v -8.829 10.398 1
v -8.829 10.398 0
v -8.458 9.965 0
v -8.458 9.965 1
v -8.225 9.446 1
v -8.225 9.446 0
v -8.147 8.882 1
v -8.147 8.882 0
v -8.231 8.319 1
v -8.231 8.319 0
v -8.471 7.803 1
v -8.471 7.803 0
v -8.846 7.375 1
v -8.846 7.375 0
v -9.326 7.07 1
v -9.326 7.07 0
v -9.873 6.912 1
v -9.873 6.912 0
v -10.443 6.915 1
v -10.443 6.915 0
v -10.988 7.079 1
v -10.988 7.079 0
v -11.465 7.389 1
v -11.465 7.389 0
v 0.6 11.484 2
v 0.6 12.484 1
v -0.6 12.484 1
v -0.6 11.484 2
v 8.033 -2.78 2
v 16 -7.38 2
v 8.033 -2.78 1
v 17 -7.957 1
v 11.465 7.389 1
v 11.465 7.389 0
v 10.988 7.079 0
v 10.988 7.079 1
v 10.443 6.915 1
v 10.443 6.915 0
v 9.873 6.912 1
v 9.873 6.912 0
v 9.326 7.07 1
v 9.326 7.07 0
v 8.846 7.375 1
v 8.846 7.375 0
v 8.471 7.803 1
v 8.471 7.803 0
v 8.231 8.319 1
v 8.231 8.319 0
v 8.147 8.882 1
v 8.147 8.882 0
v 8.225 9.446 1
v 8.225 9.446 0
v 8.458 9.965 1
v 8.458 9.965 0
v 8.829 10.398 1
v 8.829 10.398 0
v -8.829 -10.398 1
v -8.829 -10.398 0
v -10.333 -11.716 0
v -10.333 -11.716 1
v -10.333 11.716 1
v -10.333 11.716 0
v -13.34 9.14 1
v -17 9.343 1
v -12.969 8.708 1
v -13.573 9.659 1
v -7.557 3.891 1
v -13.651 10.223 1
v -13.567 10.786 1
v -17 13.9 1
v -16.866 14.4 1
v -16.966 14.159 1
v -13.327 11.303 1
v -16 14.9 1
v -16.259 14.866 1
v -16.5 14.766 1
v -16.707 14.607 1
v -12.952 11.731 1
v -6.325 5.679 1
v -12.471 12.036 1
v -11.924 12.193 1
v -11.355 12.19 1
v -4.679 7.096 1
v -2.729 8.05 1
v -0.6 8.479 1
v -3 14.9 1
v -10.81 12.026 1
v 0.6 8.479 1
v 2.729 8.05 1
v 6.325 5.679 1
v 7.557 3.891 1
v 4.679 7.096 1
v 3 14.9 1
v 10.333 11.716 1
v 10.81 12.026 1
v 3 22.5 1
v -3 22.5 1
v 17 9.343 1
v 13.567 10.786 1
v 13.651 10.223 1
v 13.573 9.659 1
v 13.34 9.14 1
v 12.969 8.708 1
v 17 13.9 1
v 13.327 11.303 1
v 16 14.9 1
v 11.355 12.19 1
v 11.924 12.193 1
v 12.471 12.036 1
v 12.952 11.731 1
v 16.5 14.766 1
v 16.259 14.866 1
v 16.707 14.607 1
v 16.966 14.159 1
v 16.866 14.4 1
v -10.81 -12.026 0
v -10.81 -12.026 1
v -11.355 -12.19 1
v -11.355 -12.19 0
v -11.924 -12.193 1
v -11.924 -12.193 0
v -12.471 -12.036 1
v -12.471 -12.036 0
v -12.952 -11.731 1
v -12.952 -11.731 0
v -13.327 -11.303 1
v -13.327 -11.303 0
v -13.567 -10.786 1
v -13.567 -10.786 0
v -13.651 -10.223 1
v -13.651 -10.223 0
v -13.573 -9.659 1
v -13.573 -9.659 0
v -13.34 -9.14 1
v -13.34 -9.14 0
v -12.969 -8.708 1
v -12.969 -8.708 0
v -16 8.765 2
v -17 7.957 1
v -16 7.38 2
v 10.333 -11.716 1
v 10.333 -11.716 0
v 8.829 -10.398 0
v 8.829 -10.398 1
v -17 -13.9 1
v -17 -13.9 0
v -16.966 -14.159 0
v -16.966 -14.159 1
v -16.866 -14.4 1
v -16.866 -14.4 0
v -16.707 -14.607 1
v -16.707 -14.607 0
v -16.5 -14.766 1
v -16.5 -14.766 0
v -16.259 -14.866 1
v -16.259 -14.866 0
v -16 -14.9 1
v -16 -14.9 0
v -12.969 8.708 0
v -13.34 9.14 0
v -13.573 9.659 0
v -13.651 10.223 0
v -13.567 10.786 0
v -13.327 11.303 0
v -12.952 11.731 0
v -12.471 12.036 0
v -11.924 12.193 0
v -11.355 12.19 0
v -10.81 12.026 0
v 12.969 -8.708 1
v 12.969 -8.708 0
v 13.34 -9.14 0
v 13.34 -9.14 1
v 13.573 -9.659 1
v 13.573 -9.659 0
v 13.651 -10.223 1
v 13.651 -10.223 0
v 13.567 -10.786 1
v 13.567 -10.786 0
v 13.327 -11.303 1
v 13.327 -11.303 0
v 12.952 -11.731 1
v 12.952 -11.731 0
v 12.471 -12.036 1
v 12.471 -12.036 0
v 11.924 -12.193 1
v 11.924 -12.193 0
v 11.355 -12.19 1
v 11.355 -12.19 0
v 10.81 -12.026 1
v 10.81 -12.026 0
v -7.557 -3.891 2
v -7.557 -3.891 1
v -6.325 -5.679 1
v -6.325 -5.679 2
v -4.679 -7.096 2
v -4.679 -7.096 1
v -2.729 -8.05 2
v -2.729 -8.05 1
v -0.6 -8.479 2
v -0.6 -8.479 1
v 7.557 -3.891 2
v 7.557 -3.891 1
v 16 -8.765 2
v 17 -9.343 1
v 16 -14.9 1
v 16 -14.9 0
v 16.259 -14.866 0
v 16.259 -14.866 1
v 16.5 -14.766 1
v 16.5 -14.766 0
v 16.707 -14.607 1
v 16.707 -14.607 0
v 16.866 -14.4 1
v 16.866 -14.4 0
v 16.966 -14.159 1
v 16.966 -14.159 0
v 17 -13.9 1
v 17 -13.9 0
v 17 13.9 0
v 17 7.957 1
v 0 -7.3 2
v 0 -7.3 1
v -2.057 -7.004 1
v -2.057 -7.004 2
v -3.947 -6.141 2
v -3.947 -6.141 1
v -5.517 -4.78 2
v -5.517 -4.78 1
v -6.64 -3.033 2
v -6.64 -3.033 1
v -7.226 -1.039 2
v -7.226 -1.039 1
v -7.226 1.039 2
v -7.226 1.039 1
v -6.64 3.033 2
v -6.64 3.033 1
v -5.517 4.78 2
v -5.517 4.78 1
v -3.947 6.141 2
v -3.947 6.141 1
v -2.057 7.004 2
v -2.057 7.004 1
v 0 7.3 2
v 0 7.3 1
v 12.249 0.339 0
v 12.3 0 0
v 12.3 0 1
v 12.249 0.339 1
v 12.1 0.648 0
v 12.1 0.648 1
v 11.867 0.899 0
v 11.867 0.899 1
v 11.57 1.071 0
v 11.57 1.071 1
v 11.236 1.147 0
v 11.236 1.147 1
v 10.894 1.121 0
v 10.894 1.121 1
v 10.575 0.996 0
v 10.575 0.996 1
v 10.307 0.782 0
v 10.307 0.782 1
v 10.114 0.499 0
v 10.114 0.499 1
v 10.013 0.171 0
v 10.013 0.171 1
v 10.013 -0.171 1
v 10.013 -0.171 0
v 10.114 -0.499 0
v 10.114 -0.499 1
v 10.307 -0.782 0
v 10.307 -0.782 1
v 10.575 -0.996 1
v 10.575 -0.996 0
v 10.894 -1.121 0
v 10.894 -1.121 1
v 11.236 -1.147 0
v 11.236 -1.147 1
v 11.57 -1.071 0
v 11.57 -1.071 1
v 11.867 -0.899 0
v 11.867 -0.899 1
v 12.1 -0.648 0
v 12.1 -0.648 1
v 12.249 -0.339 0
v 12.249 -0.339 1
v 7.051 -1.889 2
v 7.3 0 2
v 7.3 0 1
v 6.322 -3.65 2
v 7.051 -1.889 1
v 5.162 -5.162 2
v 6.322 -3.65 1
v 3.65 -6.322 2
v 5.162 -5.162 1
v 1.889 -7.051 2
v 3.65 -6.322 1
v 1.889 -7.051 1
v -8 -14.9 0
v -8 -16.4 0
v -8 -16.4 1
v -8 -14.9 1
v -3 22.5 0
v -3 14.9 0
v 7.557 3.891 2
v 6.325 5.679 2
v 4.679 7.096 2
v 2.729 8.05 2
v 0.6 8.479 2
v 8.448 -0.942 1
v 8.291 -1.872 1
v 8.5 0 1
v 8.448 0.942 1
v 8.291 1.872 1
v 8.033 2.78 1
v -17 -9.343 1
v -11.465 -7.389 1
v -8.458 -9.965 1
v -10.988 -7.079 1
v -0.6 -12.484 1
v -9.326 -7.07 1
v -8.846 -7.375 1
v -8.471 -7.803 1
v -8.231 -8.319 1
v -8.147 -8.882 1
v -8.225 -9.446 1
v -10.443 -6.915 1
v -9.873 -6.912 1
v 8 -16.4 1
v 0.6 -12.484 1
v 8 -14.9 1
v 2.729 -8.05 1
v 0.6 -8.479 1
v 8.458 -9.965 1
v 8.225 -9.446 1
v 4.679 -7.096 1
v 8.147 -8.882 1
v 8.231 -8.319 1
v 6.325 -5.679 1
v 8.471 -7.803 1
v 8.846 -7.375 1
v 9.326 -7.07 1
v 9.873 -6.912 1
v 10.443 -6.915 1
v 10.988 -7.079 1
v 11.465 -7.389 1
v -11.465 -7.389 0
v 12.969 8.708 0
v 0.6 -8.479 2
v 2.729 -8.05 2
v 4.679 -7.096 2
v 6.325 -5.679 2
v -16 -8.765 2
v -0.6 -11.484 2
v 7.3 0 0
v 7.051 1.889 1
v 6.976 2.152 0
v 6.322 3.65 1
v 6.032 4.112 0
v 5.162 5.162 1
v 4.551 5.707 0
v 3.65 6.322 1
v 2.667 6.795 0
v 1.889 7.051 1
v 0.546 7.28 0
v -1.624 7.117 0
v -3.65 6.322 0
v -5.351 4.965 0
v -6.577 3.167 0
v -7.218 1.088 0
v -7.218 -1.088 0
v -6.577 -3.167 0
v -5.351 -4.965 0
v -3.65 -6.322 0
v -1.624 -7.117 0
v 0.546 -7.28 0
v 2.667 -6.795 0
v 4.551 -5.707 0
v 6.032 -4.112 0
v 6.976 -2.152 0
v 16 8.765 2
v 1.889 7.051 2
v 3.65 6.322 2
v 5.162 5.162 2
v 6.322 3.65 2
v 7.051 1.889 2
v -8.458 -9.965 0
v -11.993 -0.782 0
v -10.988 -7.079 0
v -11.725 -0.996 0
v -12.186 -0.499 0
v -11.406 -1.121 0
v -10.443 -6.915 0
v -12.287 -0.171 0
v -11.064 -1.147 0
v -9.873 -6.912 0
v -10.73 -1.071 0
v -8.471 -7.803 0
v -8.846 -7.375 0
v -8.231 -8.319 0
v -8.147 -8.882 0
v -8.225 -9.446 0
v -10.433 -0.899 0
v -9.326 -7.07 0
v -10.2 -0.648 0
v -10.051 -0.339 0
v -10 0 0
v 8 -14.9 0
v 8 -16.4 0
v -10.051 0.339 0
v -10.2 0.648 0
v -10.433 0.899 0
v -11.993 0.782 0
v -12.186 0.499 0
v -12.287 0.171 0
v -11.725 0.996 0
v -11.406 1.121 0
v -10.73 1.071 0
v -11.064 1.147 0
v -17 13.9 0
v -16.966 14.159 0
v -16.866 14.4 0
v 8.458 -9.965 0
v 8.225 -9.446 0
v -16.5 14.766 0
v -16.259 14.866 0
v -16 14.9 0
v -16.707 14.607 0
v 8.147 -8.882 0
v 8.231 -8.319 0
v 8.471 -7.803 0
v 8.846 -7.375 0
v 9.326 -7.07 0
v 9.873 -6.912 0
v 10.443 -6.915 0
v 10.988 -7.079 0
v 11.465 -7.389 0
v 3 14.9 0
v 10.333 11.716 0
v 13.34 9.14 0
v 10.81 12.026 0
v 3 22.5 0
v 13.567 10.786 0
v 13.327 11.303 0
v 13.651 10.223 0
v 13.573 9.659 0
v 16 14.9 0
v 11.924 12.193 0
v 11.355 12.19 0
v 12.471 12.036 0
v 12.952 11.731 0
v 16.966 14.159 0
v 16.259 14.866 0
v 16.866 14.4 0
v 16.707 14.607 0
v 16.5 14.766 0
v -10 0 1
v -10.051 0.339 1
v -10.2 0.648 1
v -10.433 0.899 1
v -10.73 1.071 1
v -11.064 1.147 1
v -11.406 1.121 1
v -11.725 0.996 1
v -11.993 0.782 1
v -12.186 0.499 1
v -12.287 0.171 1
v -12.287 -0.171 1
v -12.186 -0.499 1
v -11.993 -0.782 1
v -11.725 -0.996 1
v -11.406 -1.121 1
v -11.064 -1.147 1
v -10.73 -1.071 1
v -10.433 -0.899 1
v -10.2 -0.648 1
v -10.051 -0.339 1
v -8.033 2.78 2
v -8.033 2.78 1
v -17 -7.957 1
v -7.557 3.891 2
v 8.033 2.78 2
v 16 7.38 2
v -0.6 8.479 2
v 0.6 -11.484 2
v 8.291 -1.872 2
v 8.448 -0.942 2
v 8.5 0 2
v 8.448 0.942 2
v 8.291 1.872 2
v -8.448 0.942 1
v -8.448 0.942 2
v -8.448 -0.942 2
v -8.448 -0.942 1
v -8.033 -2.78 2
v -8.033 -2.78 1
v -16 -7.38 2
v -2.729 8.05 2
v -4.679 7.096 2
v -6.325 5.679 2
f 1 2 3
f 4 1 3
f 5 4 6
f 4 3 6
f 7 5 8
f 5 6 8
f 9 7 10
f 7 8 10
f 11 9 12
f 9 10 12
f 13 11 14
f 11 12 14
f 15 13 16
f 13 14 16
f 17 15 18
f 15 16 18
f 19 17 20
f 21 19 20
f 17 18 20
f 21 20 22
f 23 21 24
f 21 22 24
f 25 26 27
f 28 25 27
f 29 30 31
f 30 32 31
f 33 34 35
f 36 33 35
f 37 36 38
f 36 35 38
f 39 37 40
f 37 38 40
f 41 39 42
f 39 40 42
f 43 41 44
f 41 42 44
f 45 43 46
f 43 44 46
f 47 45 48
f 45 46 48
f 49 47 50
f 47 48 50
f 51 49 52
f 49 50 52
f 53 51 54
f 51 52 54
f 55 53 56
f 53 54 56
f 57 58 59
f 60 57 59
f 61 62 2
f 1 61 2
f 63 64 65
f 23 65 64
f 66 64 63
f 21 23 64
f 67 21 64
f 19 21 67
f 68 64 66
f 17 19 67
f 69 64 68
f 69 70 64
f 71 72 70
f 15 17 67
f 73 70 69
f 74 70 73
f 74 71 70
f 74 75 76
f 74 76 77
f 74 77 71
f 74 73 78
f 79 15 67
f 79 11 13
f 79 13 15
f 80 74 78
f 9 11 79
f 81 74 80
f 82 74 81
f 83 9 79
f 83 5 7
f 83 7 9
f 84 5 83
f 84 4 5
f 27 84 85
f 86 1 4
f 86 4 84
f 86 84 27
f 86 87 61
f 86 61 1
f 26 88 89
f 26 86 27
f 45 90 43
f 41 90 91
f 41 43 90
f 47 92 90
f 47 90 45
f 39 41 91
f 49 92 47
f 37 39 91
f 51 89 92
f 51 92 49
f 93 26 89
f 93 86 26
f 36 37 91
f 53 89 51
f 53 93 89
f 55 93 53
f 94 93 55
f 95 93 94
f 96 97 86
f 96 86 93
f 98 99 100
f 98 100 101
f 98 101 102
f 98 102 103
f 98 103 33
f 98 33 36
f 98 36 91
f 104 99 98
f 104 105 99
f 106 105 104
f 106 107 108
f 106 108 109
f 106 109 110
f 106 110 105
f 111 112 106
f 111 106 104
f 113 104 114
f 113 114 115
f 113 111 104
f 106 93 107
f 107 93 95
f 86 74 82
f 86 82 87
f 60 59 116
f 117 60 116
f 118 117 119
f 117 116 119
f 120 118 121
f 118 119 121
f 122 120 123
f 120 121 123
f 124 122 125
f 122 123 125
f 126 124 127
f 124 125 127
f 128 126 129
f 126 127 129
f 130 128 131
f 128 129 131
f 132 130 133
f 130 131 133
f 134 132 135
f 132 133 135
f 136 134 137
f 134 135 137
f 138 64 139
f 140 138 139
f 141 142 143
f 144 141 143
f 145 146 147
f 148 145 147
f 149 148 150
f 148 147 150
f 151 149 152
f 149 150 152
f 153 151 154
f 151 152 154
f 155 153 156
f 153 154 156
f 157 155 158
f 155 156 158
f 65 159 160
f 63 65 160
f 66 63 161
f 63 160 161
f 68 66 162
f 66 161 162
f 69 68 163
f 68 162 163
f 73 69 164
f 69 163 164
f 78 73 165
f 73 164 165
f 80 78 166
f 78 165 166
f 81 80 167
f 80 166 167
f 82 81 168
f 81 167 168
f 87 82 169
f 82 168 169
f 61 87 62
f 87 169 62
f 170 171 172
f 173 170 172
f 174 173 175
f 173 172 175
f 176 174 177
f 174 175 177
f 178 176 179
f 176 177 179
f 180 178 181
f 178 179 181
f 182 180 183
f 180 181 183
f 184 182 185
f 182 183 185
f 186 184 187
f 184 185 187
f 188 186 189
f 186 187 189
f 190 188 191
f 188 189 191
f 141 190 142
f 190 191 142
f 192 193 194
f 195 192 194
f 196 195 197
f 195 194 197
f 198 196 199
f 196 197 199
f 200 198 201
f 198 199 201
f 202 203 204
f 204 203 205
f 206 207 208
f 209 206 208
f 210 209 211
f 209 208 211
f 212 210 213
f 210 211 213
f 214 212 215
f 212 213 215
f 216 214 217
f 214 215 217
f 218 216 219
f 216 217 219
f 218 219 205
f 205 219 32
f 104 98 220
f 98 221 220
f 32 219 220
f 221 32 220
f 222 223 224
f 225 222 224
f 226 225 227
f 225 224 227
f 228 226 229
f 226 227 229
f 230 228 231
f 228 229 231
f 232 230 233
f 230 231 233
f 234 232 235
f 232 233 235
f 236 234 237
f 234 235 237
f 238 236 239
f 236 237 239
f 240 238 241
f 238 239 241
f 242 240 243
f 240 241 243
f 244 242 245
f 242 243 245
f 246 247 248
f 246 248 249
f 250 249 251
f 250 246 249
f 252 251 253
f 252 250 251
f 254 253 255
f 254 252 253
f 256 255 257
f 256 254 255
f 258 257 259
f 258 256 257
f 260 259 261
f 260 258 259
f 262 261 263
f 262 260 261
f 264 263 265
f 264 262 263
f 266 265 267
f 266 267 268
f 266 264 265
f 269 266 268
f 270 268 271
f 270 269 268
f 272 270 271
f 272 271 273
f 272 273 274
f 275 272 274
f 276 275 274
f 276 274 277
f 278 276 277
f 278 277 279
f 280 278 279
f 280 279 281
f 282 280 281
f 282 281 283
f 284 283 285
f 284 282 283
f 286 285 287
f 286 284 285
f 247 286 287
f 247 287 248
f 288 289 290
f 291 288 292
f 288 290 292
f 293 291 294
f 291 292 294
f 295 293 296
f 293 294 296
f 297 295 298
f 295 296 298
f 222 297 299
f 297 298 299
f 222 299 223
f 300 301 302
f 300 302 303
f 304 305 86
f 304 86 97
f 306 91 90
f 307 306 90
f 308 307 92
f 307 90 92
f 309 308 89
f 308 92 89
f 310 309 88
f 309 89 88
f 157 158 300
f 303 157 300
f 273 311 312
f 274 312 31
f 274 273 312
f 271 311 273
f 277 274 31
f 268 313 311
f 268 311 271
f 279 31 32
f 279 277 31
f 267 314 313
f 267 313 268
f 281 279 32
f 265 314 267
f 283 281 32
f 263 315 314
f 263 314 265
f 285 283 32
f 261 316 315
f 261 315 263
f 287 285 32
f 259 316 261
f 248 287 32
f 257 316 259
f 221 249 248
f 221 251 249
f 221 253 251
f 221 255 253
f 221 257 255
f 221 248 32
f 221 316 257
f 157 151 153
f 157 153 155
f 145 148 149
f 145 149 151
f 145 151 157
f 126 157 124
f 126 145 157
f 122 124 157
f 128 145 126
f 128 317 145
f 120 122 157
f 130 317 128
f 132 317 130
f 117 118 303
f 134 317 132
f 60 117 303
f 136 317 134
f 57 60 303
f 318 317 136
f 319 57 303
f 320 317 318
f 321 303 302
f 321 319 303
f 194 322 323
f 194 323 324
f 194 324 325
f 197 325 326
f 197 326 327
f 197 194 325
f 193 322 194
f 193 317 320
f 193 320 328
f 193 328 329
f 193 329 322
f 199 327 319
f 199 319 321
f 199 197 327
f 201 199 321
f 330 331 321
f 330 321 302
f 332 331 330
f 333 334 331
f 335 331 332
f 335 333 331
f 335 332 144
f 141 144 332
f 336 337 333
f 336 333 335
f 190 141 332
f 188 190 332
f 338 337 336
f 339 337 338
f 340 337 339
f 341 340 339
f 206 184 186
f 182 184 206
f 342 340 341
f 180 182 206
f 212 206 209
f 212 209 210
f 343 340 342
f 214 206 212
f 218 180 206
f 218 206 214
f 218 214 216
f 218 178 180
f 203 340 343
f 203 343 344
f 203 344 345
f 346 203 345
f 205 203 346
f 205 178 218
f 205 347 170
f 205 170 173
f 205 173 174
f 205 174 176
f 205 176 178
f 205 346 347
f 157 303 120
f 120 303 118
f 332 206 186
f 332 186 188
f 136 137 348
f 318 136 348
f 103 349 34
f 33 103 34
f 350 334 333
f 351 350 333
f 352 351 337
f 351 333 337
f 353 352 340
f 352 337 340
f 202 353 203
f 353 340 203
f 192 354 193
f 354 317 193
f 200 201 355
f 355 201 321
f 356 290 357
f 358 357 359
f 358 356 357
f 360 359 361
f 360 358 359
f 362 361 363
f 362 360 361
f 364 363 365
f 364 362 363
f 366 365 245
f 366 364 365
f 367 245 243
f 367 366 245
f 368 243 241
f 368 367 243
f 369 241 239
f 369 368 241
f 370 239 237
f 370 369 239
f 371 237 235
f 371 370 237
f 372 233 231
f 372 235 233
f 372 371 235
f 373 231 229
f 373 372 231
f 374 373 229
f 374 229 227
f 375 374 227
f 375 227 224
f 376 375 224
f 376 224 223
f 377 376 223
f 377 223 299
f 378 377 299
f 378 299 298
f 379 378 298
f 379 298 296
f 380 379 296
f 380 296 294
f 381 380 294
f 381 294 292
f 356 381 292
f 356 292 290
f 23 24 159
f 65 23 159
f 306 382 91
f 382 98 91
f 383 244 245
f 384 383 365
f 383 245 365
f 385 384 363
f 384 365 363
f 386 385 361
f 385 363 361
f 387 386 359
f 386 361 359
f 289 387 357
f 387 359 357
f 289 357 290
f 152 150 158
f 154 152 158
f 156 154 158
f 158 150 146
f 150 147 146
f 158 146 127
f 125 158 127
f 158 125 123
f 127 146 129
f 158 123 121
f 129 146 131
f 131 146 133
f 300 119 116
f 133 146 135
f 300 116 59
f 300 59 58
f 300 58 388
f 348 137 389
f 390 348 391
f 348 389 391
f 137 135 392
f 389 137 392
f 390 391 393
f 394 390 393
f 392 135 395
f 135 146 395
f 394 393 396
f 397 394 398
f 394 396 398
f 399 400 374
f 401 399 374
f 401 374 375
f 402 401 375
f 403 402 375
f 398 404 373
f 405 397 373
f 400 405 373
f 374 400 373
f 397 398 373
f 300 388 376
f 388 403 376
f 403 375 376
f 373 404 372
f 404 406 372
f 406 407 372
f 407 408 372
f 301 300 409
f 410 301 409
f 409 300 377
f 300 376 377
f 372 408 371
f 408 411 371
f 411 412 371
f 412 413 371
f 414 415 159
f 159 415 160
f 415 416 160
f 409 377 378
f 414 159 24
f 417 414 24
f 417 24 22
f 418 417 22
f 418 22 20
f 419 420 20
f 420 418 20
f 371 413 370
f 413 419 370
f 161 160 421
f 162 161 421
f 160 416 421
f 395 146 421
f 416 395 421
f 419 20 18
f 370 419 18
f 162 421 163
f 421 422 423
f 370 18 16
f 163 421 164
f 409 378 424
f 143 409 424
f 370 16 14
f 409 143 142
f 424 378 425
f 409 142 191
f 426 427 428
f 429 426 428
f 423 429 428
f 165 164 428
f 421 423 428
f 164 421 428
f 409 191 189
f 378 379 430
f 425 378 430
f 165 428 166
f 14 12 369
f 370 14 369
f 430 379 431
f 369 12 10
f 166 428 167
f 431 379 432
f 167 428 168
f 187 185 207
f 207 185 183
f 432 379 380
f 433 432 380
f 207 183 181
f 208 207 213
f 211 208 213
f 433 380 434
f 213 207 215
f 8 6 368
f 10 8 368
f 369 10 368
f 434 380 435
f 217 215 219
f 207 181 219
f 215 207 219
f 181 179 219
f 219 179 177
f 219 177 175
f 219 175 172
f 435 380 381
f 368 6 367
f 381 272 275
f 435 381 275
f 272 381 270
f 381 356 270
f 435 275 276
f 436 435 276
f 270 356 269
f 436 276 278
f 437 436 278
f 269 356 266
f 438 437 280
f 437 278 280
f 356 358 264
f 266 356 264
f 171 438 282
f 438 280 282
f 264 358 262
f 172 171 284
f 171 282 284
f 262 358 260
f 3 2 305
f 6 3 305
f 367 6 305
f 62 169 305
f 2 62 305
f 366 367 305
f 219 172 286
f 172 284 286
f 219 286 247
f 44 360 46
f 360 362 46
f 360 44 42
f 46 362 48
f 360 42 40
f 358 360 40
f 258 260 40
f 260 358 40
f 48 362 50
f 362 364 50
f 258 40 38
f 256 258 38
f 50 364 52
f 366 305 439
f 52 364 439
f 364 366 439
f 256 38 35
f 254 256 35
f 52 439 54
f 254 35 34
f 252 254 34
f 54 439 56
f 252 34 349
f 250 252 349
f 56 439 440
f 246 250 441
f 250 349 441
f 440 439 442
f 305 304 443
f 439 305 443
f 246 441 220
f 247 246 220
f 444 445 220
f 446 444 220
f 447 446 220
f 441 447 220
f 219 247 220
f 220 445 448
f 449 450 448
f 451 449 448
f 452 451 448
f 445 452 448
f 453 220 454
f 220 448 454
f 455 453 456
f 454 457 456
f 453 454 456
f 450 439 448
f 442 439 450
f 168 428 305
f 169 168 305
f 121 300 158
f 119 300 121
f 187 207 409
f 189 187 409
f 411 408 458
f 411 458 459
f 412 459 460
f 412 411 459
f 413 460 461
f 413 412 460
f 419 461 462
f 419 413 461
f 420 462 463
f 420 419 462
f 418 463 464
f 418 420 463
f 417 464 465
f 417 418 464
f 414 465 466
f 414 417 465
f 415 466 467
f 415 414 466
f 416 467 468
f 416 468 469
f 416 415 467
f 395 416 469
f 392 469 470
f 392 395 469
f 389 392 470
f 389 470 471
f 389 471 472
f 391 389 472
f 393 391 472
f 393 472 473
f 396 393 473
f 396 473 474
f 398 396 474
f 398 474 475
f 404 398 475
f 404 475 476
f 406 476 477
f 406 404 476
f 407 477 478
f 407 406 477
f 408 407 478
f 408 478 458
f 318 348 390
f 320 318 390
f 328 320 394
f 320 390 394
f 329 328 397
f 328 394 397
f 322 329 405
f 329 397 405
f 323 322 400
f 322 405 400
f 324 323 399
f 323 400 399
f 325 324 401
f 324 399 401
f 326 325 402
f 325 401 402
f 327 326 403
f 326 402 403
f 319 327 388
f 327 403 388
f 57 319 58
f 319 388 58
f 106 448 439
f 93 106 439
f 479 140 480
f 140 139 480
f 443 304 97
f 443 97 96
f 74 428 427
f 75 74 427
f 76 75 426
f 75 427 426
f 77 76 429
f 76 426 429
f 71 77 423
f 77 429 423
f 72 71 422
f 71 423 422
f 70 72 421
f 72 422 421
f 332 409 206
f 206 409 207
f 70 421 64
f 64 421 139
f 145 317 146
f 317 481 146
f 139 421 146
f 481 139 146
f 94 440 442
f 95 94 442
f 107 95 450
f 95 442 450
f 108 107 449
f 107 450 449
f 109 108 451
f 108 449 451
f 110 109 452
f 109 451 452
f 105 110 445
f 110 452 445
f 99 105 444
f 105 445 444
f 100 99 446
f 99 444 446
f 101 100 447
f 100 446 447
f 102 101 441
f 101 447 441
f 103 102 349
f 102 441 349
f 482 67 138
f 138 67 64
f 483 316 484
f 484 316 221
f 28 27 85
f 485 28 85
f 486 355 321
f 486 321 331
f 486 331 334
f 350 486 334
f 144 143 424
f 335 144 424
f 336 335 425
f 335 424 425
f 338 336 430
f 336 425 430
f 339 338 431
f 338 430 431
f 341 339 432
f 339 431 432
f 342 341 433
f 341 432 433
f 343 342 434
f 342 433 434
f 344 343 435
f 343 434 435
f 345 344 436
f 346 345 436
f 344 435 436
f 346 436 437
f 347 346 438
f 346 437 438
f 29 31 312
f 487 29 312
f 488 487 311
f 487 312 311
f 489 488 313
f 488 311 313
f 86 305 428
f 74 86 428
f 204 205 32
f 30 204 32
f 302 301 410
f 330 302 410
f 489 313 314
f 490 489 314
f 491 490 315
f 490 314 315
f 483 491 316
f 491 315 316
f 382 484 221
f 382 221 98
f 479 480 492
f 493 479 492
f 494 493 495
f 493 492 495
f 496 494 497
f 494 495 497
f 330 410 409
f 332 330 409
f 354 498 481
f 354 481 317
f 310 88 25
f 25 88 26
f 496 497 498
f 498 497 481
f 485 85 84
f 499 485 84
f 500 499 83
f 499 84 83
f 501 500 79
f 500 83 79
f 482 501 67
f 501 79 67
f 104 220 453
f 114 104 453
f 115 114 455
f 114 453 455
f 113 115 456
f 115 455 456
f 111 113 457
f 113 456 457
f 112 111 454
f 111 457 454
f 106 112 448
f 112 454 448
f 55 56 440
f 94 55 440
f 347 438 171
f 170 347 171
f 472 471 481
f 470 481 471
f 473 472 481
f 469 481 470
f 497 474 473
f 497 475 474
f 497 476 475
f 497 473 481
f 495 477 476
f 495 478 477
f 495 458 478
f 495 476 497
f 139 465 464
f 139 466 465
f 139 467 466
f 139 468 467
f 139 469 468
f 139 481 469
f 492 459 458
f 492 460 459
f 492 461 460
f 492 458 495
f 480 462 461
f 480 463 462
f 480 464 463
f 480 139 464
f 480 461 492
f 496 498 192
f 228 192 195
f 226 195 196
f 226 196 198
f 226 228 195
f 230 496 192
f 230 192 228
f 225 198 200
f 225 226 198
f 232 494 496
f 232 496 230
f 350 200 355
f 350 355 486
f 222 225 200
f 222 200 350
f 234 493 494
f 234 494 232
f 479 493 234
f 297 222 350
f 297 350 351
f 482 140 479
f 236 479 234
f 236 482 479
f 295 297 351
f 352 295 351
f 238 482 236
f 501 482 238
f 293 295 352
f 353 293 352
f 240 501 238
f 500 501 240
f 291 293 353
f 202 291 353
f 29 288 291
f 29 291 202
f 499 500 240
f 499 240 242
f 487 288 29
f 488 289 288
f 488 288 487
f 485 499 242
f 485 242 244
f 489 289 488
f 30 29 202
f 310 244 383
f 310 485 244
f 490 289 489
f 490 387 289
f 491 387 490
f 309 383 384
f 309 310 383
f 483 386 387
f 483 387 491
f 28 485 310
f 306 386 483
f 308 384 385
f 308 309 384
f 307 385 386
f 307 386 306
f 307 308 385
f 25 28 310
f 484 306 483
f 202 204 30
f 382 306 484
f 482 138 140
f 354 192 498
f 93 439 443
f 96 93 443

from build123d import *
from build123d import SkipClean  # not in build123d's __all__

# Parameters (mm, degrees)
F0_R     = 1.15
F0_R_2   = 7.3
F0_W     = 16
F0_H     = 1.5
F0_W_2   = 6
F0_H_2   = 7.6
F1_DEPTH = 1
F3_DEPTH = 1
F4_SIZE  = 0.99999


# Not quite as in the source:
# - a fillet or chamfer is up to 0.001 mm smaller than in the source, because OpenCascade refuses the exact size


with BuildPart() as f1:
    # F0 (on Top) → F1 (new body)
    with BuildSketch(Plane.XY):
        with BuildLine():
            Line((8, -14.9), (16, -14.9))
            ThreePointArc((16, -14.9), (16.7071067812, -14.6071067812), (17, -13.9))
            Line((17, -13.9), (17, 13.9))
            ThreePointArc((17, 13.9), (16.7071067812, 14.6071067812), (16, 14.9))
            Line((16, 14.9), (3, 14.9))
            Line((3, 14.9), (-3, 14.9))
            Line((-3, 14.9), (-16, 14.9))
            ThreePointArc((-16, 14.9), (-16.7071067812, 14.6071067812), (-17, 13.9))
            Line((-17, 13.9), (-17, -13.9))
            ThreePointArc((-17, -13.9), (-16.7071067812, -14.6071067812), (-16, -14.9))
            Line((-16, -14.9), (-8, -14.9))
            Line((-8, -14.9), (8, -14.9))
        make_face()
        with BuildLine():
            Line((-8.8286237822, -10.3975032323), (-10.3326805132, -11.71576472))
            ThreePointArc((-10.3326805132, -11.71576472), (-13.1549987319, -11.5299694768), (-12.9692034887, -8.7076512581))
            Line((-12.9692034887, -8.7076512581), (-11.4651467577, -7.3893897703))
            ThreePointArc((-11.4651467577, -7.3893897703), (-8.642828539, -7.5751850136), (-8.8286237822, -10.3975032323))
        make_face(mode=Mode.SUBTRACT)
        with Locations((-11.15, 0)):
            Circle(F0_R, mode=Mode.SUBTRACT)
        with BuildLine():
            ThreePointArc((12.9692034887, -8.7076512581), (13.1549987319, -11.5299694768), (10.3326805132, -11.71576472))
            Line((10.3326805132, -11.71576472), (8.8286237822, -10.3975032323))
            ThreePointArc((8.8286237822, -10.3975032323), (8.642828539, -7.5751850136), (11.4651467577, -7.3893897703))
            Line((11.4651467577, -7.3893897703), (12.9692034887, -8.7076512581))
        make_face(mode=Mode.SUBTRACT)
        Circle(F0_R_2, mode=Mode.SUBTRACT)
        with Locations((11.15, 0)):
            Circle(F0_R, mode=Mode.SUBTRACT)
        with BuildLine():
            Line((-11.4651467577, 7.3893897703), (-12.9692034887, 8.7076512581))
            ThreePointArc((-12.9692034887, 8.7076512581), (-13.1549987319, 11.5299694768), (-10.3326805132, 11.71576472))
            Line((-10.3326805132, 11.71576472), (-8.8286237822, 10.3975032323))
            ThreePointArc((-8.8286237822, 10.3975032323), (-8.642828539, 7.5751850136), (-11.4651467577, 7.3893897703))
        make_face(mode=Mode.SUBTRACT)
        with BuildLine():
            ThreePointArc((10.3326805132, 11.71576472), (13.1549987319, 11.5299694768), (12.9692034887, 8.7076512581))
            Line((12.9692034887, 8.7076512581), (11.4651467577, 7.3893897703))
            ThreePointArc((11.4651467577, 7.3893897703), (8.642828539, 7.5751850136), (8.8286237822, 10.3975032323))
            Line((8.8286237822, 10.3975032323), (10.3326805132, 11.71576472))
        make_face(mode=Mode.SUBTRACT)
        with Locations((0, -15.65)):
            Rectangle(F0_W, F0_H)
        with Locations((0, 18.7)):
            Rectangle(F0_W_2, F0_H_2)
    extrude(amount=F1_DEPTH)

    # F2 (on face) → F3 (join)
    with BuildSketch(Plane.XY.offset(1)):
        with BuildLine():
            ThreePointArc((0, 7.3), (5.1618795027, 5.1618795027), (7.3, 0))
            ThreePointArc((7.3, 0), (5.1618795027, -5.1618795027), (0, -7.3))
            Line((0, -7.3), (0.6, -7.3))
            Line((0.6, -7.3), (0.6, -8.4787970845))
            ThreePointArc((0.6, -8.4787970845), (4.6794449698, -7.0959703195), (7.5571902637, -3.8908707661))
            ThreePointArc((7.5571902637, -3.8908707661), (7.8146834893, -3.3437586578), (8.0326290711, -2.7797248435))
            ThreePointArc((8.0326290711, -2.7797248435), (8.3823429632, -1.4093709404), (8.5, 0))
            ThreePointArc((8.5, 0), (8.3823429632, 1.4093709404), (8.0326290711, 2.7797248435))
            ThreePointArc((8.0326290711, 2.7797248435), (7.8146834893, 3.3437586578), (7.5571902637, 3.8908707661))
            ThreePointArc((7.5571902637, 3.8908707661), (4.6794449698, 7.0959703195), (0.6, 8.4787970845))
            Line((0.6, 8.4787970845), (0.6, 7.3))
            Line((0.6, 7.3), (0, 7.3))
        make_face()
        with BuildLine():
            Line((-0.6, 7.3), (0, 7.3))
            Line((0, 7.3), (0.6, 7.3))
            Line((0.6, 7.3), (0.6, 8.4787970845))
            ThreePointArc((0.6, 8.4787970845), (0, 8.5), (-0.6, 8.4787970845))
            Line((-0.6, 8.4787970845), (-0.6, 7.3))
        make_face()
        with BuildLine():
            ThreePointArc((0, -7.3), (-7.3, 0), (0, 7.3))
            Line((0, 7.3), (-0.6, 7.3))
            Line((-0.6, 7.3), (-0.6, 8.4787970845))
            ThreePointArc((-0.6, 8.4787970845), (-4.6794449698, 7.0959703195), (-7.5571902637, 3.8908707661))
            ThreePointArc((-7.5571902637, 3.8908707661), (-7.8146834893, 3.3437586578), (-8.0326290711, 2.7797248435))
            ThreePointArc((-8.0326290711, 2.7797248435), (-8.5, 0), (-8.0326290711, -2.7797248435))
            ThreePointArc((-8.0326290711, -2.7797248435), (-7.8146834893, -3.3437586578), (-7.5571902637, -3.8908707661))
            ThreePointArc((-7.5571902637, -3.8908707661), (-4.6794449698, -7.0959703195), (-0.6, -8.4787970845))
            Line((-0.6, -8.4787970845), (-0.6, -7.3))
            Line((-0.6, -7.3), (0, -7.3))
        make_face()
        with BuildLine():
            Line((0.6, -7.3), (0, -7.3))
            Line((0, -7.3), (-0.6, -7.3))
            Line((-0.6, -7.3), (-0.6, -8.4787970845))
            ThreePointArc((-0.6, -8.4787970845), (0, -8.5), (0.6, -8.4787970845))
            Line((0.6, -8.4787970845), (0.6, -7.3))
        make_face()
        with BuildLine():
            ThreePointArc((-0.6, 8.4787970845), (0, 8.5), (0.6, 8.4787970845))
            Line((0.6, 8.4787970845), (0.6, 11.4843371598))
            Line((0.6, 11.4843371598), (-0.6, 11.4843371598))
            Line((-0.6, 11.4843371598), (-0.6, 8.4787970845))
        make_face()
        with BuildLine():
            Line((0.6, -11.4843371598), (0.6, -8.4787970845))
            ThreePointArc((0.6, -8.4787970845), (0, -8.5), (-0.6, -8.4787970845))
            Line((-0.6, -8.4787970845), (-0.6, -11.4843371598))
            Line((-0.6, -11.4843371598), (0.6, -11.4843371598))
        make_face()
        with BuildLine():
            ThreePointArc((-8.0326290711, 2.7797248435), (-7.8146834893, 3.3437586578), (-7.5571902637, 3.8908707661))
            Line((-7.5571902637, 3.8908707661), (-17, 9.3426795092))
            Line((-17, 9.3426795092), (-17, 7.9570388632))
            Line((-17, 7.9570388632), (-8.0326290711, 2.7797248435))
        make_face()
        with BuildLine():
            Line((-17, -9.3426795092), (-7.5571902637, -3.8908707661))
            ThreePointArc((-7.5571902637, -3.8908707661), (-7.8146834893, -3.3437586578), (-8.0326290711, -2.7797248435))
            Line((-8.0326290711, -2.7797248435), (-17, -7.9570388632))
            Line((-17, -7.9570388632), (-17, -9.3426795092))
        make_face()
        with BuildLine():
            ThreePointArc((8.0326290711, -2.7797248435), (7.8146834893, -3.3437586578), (7.5571902637, -3.8908707661))
            Line((7.5571902637, -3.8908707661), (17, -9.3426795092))
            Line((17, -9.3426795092), (17, -7.9570388632))
            Line((17, -7.9570388632), (8.0326290711, -2.7797248435))
        make_face()
        with BuildLine():
            Line((17, 9.3426795092), (7.5571902637, 3.8908707661))
            ThreePointArc((7.5571902637, 3.8908707661), (7.8146834893, 3.3437586578), (8.0326290711, 2.7797248435))
            Line((8.0326290711, 2.7797248435), (17, 7.9570388632))
            Line((17, 7.9570388632), (17, 9.3426795092))
        make_face()
    with SkipClean():  # cleaning this boolean's faces spoils the solid; the shape is the same uncleaned
        extrude(amount=F3_DEPTH)

    # F4 (size 1 in the source; OpenCascade refuses exactly that, so slightly less here)
    f4_edges = [f1.edges().sort_by_distance(p)[0] for p in [
        (0, 11.484337, 1),
        (0, -11.484337, 1),
        (-17, -8.649859, 2),
        (17, -8.649859, 2),
        (-17, 8.649859, 2),
        (17, 8.649859, 2),
    ]]
    chamfer(f4_edges, length=F4_SIZE)


solid = f1.part
